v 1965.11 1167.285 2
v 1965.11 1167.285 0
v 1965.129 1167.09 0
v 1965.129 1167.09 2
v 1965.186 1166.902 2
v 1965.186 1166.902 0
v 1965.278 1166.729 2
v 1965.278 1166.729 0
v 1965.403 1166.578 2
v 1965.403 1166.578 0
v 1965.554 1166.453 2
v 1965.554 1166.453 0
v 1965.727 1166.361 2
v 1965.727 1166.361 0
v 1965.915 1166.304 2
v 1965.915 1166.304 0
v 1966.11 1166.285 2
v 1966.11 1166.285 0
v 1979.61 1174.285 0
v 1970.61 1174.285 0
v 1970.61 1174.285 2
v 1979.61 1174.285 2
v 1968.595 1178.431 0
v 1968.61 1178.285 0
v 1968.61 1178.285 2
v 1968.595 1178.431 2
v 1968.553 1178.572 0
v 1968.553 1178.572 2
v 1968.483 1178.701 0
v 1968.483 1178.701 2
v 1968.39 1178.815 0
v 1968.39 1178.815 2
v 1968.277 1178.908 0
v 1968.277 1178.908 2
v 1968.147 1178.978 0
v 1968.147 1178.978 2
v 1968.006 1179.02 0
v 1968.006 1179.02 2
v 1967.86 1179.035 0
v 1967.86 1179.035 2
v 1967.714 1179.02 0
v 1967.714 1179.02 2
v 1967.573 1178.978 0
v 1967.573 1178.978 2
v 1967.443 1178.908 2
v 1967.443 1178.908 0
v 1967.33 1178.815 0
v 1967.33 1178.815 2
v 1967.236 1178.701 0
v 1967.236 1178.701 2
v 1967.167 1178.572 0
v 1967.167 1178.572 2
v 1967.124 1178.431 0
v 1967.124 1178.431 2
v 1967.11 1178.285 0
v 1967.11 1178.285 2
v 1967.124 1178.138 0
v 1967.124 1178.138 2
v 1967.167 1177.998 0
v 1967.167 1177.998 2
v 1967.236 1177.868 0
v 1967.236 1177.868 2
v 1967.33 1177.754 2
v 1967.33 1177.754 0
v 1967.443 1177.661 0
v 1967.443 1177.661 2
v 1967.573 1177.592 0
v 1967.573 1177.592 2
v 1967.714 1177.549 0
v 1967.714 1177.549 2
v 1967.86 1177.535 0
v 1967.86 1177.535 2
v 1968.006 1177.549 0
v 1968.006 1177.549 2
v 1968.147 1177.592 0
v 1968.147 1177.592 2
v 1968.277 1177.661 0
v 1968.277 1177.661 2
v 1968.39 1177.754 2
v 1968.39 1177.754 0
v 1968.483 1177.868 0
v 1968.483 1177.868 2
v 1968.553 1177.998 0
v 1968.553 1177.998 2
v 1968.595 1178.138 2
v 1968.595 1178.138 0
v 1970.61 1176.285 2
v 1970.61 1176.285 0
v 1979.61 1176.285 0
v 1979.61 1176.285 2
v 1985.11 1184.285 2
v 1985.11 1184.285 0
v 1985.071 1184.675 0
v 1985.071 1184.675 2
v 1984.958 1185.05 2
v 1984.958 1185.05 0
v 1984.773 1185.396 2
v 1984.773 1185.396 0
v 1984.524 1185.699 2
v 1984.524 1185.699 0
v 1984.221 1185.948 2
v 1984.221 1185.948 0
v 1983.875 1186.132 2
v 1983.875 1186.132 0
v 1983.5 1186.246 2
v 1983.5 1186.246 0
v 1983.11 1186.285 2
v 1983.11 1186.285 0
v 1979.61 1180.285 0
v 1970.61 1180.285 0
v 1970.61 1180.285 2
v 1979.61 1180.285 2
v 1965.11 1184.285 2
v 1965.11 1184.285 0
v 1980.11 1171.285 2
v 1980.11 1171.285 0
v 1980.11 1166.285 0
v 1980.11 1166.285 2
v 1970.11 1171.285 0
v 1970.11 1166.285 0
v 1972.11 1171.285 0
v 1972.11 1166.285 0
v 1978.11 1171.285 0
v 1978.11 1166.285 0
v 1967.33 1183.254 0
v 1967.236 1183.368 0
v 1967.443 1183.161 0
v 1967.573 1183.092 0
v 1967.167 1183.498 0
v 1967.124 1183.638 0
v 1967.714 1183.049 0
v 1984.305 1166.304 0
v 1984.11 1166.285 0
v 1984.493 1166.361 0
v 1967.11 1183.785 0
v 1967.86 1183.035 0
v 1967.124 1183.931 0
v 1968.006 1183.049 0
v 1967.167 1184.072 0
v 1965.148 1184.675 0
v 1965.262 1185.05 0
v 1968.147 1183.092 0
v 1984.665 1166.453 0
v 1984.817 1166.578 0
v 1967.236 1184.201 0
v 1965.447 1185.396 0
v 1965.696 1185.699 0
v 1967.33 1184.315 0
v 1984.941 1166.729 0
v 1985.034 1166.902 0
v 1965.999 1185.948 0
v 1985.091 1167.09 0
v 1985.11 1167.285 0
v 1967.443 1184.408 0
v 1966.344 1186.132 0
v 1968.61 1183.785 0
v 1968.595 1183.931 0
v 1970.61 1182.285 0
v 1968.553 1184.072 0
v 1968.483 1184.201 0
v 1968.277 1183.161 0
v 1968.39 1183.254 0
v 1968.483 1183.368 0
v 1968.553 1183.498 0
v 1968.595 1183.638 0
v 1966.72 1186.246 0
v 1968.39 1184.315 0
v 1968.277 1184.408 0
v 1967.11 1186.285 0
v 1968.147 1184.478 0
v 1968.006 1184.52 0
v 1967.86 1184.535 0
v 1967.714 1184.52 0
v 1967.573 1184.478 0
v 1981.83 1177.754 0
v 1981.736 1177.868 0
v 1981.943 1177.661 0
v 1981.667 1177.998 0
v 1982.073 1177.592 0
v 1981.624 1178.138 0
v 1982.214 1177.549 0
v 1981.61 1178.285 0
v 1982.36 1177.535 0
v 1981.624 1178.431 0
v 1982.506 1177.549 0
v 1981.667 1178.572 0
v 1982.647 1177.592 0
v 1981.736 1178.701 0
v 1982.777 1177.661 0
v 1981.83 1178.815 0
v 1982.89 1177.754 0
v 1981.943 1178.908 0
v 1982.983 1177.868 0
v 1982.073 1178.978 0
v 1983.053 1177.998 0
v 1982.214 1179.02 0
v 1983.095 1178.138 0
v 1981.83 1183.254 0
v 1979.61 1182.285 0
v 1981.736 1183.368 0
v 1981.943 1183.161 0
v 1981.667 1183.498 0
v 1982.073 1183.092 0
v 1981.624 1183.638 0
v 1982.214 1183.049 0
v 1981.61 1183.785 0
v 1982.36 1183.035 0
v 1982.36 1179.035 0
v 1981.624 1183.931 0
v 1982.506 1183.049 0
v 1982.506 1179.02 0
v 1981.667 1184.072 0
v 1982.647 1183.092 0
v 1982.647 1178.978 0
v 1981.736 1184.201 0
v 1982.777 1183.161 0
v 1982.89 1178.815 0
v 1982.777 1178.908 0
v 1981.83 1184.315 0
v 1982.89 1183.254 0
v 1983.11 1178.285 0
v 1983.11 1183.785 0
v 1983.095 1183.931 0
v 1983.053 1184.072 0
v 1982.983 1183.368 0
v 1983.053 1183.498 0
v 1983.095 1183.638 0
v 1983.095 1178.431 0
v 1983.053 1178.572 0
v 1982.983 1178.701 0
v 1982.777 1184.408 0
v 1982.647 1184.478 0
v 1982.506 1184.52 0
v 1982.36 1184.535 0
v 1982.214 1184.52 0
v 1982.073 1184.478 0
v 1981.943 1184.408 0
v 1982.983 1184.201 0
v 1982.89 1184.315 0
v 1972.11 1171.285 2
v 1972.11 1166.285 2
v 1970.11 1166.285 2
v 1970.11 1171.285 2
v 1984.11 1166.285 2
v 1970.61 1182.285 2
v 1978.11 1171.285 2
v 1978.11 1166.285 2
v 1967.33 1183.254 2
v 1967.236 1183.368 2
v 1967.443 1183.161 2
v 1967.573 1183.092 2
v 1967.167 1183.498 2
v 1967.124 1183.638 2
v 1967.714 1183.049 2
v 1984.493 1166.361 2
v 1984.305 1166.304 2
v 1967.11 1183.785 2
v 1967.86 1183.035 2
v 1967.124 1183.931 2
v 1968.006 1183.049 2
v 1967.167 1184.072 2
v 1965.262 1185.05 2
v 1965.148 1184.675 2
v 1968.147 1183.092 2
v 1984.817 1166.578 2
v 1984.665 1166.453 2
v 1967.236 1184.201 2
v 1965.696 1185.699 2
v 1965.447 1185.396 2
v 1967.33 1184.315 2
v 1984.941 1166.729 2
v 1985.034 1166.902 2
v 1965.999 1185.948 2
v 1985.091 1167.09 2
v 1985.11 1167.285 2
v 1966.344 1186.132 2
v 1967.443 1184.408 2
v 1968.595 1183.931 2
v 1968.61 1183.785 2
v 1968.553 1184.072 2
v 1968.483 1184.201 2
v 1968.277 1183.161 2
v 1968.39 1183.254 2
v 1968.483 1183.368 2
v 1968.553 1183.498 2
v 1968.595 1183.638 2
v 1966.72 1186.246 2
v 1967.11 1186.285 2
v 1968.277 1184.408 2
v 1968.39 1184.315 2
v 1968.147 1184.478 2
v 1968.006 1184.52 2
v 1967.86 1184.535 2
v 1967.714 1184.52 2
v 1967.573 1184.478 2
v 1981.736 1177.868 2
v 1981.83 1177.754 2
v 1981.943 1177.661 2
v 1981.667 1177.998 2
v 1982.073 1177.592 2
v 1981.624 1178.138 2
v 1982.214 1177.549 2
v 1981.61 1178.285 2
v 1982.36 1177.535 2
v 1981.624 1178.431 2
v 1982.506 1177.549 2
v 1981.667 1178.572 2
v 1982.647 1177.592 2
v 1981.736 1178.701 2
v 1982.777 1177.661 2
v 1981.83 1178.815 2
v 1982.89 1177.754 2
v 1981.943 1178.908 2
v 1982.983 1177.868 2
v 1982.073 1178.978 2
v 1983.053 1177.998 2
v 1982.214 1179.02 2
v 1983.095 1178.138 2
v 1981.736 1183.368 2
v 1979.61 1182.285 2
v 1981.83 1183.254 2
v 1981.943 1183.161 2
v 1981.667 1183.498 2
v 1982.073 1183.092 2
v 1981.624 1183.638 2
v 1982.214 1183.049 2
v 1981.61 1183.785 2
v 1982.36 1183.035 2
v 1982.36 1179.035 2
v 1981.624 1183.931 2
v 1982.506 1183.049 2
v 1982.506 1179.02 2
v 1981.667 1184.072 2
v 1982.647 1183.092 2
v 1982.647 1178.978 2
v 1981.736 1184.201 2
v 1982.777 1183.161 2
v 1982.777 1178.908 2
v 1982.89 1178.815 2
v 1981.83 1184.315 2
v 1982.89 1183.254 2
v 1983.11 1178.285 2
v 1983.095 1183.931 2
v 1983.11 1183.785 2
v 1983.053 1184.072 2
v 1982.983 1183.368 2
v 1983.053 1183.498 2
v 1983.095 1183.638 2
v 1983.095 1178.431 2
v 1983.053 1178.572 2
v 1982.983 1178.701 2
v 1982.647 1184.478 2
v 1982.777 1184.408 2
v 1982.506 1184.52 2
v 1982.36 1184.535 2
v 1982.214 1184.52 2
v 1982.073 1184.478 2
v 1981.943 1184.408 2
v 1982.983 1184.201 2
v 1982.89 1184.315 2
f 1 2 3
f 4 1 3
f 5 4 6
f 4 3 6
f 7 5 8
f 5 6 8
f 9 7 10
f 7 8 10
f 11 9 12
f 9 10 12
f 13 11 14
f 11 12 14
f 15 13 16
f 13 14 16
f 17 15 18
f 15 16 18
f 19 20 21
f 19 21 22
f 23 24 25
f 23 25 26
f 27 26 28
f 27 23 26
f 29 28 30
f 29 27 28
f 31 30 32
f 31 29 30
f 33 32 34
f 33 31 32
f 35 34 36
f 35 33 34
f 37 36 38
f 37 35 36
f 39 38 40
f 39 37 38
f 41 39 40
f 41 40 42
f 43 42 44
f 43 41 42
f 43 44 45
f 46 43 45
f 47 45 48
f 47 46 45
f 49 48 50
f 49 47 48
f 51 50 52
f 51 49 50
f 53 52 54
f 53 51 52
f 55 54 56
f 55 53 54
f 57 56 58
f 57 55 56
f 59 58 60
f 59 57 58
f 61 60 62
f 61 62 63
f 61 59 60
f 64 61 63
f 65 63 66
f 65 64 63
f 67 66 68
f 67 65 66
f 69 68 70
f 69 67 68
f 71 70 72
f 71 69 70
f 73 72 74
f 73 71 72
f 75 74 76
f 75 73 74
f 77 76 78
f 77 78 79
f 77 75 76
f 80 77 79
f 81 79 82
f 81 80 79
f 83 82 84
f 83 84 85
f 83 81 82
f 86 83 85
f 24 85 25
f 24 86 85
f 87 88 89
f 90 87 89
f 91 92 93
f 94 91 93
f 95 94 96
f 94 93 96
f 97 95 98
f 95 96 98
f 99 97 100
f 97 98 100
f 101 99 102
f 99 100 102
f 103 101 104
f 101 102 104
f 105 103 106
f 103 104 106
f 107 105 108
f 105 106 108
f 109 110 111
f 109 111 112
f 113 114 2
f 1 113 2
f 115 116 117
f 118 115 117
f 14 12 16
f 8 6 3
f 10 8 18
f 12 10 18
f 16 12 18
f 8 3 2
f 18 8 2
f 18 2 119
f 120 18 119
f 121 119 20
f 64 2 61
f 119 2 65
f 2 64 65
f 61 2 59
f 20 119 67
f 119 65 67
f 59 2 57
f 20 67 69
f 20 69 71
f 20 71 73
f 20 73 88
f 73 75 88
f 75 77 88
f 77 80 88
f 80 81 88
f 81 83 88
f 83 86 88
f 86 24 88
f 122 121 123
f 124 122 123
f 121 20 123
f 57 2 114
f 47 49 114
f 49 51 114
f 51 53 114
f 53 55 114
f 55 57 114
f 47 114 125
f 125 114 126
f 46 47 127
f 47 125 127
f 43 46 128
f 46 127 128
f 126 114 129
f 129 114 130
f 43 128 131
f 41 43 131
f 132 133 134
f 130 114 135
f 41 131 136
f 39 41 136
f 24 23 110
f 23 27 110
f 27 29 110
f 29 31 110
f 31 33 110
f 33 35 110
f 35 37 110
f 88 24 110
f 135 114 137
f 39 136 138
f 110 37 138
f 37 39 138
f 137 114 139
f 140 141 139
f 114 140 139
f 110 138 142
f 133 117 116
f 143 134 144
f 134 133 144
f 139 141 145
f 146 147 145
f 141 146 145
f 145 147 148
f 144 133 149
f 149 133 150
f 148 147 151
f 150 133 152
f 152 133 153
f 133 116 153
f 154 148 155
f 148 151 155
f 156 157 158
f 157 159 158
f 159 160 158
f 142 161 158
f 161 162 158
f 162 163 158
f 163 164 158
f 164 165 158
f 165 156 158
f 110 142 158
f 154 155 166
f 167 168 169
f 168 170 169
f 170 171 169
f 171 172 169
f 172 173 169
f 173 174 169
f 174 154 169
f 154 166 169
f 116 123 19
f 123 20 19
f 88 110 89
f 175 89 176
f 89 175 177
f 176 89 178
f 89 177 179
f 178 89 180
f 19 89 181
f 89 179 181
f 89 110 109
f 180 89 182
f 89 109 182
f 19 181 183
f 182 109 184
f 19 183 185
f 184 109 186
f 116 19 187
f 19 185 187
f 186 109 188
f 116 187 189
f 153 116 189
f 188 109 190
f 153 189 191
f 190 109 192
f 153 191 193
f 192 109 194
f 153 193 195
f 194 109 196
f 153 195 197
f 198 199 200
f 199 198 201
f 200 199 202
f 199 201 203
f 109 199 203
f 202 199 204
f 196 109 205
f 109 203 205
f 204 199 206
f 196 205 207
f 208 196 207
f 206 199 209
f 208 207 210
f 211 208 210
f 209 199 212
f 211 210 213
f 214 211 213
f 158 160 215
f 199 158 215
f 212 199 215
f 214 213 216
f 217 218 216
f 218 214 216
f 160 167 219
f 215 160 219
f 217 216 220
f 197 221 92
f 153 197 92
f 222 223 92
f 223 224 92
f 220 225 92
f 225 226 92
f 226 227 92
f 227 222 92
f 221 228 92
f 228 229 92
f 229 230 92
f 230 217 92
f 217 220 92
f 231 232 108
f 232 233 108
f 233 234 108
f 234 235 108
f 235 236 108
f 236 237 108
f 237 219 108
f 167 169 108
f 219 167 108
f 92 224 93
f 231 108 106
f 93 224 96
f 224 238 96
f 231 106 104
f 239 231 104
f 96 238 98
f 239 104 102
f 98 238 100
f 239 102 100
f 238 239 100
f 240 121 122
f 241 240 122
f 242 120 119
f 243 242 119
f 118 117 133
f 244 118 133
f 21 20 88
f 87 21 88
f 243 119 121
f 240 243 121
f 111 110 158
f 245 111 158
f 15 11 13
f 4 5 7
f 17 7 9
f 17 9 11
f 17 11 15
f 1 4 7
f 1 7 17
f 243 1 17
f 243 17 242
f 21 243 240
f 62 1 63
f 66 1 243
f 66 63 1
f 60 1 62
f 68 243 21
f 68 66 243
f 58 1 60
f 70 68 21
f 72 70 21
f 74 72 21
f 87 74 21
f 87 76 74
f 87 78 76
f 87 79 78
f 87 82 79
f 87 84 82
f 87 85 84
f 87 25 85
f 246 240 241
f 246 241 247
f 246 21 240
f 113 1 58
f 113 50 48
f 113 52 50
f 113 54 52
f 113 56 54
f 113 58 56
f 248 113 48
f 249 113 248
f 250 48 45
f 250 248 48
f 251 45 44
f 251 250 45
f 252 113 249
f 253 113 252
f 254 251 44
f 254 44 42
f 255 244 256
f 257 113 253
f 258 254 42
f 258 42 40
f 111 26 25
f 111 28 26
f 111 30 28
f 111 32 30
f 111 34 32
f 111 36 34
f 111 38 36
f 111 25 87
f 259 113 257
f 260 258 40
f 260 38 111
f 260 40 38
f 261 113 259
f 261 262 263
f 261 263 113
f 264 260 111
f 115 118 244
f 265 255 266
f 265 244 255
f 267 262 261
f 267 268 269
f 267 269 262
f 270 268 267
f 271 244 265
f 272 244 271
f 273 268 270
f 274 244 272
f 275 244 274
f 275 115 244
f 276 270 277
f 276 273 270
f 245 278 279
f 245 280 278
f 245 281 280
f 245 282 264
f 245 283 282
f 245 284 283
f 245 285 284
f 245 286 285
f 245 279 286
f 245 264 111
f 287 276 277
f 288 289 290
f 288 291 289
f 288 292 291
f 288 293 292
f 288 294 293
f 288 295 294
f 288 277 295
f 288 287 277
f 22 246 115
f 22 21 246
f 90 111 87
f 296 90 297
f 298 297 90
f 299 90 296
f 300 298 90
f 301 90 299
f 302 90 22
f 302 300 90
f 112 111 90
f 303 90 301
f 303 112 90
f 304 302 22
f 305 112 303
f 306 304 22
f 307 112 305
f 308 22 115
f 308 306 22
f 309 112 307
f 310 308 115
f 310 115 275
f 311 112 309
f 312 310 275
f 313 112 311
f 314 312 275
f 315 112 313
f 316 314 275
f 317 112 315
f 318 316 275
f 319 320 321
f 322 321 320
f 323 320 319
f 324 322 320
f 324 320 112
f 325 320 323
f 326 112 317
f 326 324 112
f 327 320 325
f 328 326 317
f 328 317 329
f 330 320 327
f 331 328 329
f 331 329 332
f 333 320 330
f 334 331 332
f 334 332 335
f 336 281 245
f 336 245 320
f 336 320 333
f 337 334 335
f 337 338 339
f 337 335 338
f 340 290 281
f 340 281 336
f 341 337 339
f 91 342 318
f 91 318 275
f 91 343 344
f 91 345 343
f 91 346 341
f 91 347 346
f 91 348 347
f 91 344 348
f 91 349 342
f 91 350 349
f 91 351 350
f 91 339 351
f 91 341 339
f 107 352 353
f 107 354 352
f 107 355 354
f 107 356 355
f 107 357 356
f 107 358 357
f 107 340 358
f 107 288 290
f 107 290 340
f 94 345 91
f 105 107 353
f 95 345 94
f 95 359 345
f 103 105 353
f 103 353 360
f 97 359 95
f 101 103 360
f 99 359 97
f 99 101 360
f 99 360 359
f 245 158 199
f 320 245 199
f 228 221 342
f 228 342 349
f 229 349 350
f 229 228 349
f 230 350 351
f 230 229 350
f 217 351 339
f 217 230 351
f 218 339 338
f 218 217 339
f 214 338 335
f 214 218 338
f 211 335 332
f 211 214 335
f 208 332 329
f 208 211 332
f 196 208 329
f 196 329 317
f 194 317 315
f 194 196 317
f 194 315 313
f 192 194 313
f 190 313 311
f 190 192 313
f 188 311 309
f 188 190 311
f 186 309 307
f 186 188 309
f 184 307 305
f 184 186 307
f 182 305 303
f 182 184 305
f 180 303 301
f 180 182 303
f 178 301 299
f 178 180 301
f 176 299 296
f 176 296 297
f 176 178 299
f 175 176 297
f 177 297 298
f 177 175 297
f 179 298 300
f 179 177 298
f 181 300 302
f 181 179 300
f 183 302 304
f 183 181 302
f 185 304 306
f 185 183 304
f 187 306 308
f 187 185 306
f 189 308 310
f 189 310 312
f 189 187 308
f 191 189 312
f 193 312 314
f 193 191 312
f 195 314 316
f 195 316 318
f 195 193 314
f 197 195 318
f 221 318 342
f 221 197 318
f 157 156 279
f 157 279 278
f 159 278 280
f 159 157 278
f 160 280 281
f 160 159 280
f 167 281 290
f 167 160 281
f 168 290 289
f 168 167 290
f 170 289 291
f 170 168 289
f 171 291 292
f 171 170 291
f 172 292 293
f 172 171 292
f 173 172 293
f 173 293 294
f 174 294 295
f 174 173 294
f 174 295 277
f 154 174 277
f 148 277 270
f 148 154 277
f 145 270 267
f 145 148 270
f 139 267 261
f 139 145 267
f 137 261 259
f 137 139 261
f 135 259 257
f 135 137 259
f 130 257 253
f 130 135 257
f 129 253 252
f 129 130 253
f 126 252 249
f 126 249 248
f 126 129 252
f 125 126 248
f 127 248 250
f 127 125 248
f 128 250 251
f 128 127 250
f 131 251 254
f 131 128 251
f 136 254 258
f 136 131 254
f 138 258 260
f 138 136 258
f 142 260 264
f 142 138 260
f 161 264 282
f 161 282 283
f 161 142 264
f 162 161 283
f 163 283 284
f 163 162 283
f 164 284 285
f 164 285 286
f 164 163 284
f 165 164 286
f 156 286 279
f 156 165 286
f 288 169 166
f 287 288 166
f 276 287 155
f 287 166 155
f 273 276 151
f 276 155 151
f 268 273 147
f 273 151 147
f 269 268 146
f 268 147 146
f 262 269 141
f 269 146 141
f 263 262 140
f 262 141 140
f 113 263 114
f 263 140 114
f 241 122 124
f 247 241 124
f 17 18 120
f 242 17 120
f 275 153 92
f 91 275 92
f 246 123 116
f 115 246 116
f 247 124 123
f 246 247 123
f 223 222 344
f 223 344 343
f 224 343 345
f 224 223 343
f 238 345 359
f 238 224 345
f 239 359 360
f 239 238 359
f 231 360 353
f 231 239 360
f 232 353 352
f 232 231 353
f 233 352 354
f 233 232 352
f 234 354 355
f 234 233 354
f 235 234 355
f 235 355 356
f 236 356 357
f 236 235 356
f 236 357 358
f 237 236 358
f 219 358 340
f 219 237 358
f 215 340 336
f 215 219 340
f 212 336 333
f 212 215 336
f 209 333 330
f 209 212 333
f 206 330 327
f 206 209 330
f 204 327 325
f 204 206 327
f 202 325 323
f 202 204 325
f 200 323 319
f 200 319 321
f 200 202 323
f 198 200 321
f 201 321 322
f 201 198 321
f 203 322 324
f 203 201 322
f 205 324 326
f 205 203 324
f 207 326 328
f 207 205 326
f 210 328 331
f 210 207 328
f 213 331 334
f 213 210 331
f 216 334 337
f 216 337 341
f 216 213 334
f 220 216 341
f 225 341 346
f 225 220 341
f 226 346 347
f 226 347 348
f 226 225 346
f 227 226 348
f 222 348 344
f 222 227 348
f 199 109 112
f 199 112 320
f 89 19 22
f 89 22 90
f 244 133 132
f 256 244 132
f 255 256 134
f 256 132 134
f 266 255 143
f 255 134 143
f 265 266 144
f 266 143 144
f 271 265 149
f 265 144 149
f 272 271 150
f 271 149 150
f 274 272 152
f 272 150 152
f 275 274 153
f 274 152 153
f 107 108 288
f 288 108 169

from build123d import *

# Parameters (mm, degrees)
MODEL_R             = 0.75
MODEL_W             = 9
MODEL_H             = 2
BOSS_EXTRUDE1_DEPTH = 2


with BuildPart() as part:
    # Model → Boss-Extrude1 (new body)
    with BuildSketch(Plane.XY):
        with BuildLine():
            Line((1972.109841287, 1171.284705077), (1972.109841287, 1166.284705077))
            Line((1972.109841287, 1166.284705077), (1978.109841287, 1166.284705077))
            Line((1978.109841287, 1166.284705077), (1978.109841287, 1171.284705077))
            Line((1978.109841287, 1171.284705077), (1980.109841287, 1171.284705077))
            Line((1980.109841287, 1171.284705077), (1980.109841287, 1166.284705077))
            Line((1980.109841287, 1166.284705077), (1984.109841287, 1166.284705077))
            ThreePointArc((1984.109841287, 1166.284705077), (1984.816948068, 1166.577598295), (1985.109841287, 1167.284705077))
            Line((1985.109841287, 1167.284705077), (1985.109841287, 1184.284705077))
            ThreePointArc((1985.109841287, 1184.284705077), (1984.524054849, 1185.698918639), (1983.109841287, 1186.284705077))
            Line((1983.109841287, 1186.284705077), (1967.109841287, 1186.284705077))
            ThreePointArc((1967.109841287, 1186.284705077), (1965.695627724, 1185.698918639), (1965.109841287, 1184.284705077))
            Line((1965.109841287, 1184.284705077), (1965.109841287, 1167.284705077))
            ThreePointArc((1965.109841287, 1167.284705077), (1965.402734505, 1166.577598295), (1966.109841287, 1166.284705077))
            Line((1966.109841287, 1166.284705077), (1970.109841287, 1166.284705077))
            Line((1970.109841287, 1166.284705077), (1970.109841287, 1171.284705077))
            Line((1970.109841287, 1171.284705077), (1972.109841287, 1171.284705077))
        make_face()
        with Locations((1982.359841287, 1183.784705077)):
            Circle(MODEL_R, mode=Mode.SUBTRACT)
        with Locations((1967.859841287, 1183.784705077)):
            Circle(MODEL_R, mode=Mode.SUBTRACT)
        with Locations((1982.359841287, 1178.284705077)):
            Circle(MODEL_R, mode=Mode.SUBTRACT)
        with Locations((1967.859841287, 1178.284705077)):
            Circle(MODEL_R, mode=Mode.SUBTRACT)
        with Locations((1975.109841287, 1181.284705077)):
            Rectangle(MODEL_W, MODEL_H, mode=Mode.SUBTRACT)
        with Locations((1975.109841287, 1175.284705077)):
            Rectangle(MODEL_W, MODEL_H, mode=Mode.SUBTRACT)
    extrude(amount=BOSS_EXTRUDE1_DEPTH)


solid = part.part
